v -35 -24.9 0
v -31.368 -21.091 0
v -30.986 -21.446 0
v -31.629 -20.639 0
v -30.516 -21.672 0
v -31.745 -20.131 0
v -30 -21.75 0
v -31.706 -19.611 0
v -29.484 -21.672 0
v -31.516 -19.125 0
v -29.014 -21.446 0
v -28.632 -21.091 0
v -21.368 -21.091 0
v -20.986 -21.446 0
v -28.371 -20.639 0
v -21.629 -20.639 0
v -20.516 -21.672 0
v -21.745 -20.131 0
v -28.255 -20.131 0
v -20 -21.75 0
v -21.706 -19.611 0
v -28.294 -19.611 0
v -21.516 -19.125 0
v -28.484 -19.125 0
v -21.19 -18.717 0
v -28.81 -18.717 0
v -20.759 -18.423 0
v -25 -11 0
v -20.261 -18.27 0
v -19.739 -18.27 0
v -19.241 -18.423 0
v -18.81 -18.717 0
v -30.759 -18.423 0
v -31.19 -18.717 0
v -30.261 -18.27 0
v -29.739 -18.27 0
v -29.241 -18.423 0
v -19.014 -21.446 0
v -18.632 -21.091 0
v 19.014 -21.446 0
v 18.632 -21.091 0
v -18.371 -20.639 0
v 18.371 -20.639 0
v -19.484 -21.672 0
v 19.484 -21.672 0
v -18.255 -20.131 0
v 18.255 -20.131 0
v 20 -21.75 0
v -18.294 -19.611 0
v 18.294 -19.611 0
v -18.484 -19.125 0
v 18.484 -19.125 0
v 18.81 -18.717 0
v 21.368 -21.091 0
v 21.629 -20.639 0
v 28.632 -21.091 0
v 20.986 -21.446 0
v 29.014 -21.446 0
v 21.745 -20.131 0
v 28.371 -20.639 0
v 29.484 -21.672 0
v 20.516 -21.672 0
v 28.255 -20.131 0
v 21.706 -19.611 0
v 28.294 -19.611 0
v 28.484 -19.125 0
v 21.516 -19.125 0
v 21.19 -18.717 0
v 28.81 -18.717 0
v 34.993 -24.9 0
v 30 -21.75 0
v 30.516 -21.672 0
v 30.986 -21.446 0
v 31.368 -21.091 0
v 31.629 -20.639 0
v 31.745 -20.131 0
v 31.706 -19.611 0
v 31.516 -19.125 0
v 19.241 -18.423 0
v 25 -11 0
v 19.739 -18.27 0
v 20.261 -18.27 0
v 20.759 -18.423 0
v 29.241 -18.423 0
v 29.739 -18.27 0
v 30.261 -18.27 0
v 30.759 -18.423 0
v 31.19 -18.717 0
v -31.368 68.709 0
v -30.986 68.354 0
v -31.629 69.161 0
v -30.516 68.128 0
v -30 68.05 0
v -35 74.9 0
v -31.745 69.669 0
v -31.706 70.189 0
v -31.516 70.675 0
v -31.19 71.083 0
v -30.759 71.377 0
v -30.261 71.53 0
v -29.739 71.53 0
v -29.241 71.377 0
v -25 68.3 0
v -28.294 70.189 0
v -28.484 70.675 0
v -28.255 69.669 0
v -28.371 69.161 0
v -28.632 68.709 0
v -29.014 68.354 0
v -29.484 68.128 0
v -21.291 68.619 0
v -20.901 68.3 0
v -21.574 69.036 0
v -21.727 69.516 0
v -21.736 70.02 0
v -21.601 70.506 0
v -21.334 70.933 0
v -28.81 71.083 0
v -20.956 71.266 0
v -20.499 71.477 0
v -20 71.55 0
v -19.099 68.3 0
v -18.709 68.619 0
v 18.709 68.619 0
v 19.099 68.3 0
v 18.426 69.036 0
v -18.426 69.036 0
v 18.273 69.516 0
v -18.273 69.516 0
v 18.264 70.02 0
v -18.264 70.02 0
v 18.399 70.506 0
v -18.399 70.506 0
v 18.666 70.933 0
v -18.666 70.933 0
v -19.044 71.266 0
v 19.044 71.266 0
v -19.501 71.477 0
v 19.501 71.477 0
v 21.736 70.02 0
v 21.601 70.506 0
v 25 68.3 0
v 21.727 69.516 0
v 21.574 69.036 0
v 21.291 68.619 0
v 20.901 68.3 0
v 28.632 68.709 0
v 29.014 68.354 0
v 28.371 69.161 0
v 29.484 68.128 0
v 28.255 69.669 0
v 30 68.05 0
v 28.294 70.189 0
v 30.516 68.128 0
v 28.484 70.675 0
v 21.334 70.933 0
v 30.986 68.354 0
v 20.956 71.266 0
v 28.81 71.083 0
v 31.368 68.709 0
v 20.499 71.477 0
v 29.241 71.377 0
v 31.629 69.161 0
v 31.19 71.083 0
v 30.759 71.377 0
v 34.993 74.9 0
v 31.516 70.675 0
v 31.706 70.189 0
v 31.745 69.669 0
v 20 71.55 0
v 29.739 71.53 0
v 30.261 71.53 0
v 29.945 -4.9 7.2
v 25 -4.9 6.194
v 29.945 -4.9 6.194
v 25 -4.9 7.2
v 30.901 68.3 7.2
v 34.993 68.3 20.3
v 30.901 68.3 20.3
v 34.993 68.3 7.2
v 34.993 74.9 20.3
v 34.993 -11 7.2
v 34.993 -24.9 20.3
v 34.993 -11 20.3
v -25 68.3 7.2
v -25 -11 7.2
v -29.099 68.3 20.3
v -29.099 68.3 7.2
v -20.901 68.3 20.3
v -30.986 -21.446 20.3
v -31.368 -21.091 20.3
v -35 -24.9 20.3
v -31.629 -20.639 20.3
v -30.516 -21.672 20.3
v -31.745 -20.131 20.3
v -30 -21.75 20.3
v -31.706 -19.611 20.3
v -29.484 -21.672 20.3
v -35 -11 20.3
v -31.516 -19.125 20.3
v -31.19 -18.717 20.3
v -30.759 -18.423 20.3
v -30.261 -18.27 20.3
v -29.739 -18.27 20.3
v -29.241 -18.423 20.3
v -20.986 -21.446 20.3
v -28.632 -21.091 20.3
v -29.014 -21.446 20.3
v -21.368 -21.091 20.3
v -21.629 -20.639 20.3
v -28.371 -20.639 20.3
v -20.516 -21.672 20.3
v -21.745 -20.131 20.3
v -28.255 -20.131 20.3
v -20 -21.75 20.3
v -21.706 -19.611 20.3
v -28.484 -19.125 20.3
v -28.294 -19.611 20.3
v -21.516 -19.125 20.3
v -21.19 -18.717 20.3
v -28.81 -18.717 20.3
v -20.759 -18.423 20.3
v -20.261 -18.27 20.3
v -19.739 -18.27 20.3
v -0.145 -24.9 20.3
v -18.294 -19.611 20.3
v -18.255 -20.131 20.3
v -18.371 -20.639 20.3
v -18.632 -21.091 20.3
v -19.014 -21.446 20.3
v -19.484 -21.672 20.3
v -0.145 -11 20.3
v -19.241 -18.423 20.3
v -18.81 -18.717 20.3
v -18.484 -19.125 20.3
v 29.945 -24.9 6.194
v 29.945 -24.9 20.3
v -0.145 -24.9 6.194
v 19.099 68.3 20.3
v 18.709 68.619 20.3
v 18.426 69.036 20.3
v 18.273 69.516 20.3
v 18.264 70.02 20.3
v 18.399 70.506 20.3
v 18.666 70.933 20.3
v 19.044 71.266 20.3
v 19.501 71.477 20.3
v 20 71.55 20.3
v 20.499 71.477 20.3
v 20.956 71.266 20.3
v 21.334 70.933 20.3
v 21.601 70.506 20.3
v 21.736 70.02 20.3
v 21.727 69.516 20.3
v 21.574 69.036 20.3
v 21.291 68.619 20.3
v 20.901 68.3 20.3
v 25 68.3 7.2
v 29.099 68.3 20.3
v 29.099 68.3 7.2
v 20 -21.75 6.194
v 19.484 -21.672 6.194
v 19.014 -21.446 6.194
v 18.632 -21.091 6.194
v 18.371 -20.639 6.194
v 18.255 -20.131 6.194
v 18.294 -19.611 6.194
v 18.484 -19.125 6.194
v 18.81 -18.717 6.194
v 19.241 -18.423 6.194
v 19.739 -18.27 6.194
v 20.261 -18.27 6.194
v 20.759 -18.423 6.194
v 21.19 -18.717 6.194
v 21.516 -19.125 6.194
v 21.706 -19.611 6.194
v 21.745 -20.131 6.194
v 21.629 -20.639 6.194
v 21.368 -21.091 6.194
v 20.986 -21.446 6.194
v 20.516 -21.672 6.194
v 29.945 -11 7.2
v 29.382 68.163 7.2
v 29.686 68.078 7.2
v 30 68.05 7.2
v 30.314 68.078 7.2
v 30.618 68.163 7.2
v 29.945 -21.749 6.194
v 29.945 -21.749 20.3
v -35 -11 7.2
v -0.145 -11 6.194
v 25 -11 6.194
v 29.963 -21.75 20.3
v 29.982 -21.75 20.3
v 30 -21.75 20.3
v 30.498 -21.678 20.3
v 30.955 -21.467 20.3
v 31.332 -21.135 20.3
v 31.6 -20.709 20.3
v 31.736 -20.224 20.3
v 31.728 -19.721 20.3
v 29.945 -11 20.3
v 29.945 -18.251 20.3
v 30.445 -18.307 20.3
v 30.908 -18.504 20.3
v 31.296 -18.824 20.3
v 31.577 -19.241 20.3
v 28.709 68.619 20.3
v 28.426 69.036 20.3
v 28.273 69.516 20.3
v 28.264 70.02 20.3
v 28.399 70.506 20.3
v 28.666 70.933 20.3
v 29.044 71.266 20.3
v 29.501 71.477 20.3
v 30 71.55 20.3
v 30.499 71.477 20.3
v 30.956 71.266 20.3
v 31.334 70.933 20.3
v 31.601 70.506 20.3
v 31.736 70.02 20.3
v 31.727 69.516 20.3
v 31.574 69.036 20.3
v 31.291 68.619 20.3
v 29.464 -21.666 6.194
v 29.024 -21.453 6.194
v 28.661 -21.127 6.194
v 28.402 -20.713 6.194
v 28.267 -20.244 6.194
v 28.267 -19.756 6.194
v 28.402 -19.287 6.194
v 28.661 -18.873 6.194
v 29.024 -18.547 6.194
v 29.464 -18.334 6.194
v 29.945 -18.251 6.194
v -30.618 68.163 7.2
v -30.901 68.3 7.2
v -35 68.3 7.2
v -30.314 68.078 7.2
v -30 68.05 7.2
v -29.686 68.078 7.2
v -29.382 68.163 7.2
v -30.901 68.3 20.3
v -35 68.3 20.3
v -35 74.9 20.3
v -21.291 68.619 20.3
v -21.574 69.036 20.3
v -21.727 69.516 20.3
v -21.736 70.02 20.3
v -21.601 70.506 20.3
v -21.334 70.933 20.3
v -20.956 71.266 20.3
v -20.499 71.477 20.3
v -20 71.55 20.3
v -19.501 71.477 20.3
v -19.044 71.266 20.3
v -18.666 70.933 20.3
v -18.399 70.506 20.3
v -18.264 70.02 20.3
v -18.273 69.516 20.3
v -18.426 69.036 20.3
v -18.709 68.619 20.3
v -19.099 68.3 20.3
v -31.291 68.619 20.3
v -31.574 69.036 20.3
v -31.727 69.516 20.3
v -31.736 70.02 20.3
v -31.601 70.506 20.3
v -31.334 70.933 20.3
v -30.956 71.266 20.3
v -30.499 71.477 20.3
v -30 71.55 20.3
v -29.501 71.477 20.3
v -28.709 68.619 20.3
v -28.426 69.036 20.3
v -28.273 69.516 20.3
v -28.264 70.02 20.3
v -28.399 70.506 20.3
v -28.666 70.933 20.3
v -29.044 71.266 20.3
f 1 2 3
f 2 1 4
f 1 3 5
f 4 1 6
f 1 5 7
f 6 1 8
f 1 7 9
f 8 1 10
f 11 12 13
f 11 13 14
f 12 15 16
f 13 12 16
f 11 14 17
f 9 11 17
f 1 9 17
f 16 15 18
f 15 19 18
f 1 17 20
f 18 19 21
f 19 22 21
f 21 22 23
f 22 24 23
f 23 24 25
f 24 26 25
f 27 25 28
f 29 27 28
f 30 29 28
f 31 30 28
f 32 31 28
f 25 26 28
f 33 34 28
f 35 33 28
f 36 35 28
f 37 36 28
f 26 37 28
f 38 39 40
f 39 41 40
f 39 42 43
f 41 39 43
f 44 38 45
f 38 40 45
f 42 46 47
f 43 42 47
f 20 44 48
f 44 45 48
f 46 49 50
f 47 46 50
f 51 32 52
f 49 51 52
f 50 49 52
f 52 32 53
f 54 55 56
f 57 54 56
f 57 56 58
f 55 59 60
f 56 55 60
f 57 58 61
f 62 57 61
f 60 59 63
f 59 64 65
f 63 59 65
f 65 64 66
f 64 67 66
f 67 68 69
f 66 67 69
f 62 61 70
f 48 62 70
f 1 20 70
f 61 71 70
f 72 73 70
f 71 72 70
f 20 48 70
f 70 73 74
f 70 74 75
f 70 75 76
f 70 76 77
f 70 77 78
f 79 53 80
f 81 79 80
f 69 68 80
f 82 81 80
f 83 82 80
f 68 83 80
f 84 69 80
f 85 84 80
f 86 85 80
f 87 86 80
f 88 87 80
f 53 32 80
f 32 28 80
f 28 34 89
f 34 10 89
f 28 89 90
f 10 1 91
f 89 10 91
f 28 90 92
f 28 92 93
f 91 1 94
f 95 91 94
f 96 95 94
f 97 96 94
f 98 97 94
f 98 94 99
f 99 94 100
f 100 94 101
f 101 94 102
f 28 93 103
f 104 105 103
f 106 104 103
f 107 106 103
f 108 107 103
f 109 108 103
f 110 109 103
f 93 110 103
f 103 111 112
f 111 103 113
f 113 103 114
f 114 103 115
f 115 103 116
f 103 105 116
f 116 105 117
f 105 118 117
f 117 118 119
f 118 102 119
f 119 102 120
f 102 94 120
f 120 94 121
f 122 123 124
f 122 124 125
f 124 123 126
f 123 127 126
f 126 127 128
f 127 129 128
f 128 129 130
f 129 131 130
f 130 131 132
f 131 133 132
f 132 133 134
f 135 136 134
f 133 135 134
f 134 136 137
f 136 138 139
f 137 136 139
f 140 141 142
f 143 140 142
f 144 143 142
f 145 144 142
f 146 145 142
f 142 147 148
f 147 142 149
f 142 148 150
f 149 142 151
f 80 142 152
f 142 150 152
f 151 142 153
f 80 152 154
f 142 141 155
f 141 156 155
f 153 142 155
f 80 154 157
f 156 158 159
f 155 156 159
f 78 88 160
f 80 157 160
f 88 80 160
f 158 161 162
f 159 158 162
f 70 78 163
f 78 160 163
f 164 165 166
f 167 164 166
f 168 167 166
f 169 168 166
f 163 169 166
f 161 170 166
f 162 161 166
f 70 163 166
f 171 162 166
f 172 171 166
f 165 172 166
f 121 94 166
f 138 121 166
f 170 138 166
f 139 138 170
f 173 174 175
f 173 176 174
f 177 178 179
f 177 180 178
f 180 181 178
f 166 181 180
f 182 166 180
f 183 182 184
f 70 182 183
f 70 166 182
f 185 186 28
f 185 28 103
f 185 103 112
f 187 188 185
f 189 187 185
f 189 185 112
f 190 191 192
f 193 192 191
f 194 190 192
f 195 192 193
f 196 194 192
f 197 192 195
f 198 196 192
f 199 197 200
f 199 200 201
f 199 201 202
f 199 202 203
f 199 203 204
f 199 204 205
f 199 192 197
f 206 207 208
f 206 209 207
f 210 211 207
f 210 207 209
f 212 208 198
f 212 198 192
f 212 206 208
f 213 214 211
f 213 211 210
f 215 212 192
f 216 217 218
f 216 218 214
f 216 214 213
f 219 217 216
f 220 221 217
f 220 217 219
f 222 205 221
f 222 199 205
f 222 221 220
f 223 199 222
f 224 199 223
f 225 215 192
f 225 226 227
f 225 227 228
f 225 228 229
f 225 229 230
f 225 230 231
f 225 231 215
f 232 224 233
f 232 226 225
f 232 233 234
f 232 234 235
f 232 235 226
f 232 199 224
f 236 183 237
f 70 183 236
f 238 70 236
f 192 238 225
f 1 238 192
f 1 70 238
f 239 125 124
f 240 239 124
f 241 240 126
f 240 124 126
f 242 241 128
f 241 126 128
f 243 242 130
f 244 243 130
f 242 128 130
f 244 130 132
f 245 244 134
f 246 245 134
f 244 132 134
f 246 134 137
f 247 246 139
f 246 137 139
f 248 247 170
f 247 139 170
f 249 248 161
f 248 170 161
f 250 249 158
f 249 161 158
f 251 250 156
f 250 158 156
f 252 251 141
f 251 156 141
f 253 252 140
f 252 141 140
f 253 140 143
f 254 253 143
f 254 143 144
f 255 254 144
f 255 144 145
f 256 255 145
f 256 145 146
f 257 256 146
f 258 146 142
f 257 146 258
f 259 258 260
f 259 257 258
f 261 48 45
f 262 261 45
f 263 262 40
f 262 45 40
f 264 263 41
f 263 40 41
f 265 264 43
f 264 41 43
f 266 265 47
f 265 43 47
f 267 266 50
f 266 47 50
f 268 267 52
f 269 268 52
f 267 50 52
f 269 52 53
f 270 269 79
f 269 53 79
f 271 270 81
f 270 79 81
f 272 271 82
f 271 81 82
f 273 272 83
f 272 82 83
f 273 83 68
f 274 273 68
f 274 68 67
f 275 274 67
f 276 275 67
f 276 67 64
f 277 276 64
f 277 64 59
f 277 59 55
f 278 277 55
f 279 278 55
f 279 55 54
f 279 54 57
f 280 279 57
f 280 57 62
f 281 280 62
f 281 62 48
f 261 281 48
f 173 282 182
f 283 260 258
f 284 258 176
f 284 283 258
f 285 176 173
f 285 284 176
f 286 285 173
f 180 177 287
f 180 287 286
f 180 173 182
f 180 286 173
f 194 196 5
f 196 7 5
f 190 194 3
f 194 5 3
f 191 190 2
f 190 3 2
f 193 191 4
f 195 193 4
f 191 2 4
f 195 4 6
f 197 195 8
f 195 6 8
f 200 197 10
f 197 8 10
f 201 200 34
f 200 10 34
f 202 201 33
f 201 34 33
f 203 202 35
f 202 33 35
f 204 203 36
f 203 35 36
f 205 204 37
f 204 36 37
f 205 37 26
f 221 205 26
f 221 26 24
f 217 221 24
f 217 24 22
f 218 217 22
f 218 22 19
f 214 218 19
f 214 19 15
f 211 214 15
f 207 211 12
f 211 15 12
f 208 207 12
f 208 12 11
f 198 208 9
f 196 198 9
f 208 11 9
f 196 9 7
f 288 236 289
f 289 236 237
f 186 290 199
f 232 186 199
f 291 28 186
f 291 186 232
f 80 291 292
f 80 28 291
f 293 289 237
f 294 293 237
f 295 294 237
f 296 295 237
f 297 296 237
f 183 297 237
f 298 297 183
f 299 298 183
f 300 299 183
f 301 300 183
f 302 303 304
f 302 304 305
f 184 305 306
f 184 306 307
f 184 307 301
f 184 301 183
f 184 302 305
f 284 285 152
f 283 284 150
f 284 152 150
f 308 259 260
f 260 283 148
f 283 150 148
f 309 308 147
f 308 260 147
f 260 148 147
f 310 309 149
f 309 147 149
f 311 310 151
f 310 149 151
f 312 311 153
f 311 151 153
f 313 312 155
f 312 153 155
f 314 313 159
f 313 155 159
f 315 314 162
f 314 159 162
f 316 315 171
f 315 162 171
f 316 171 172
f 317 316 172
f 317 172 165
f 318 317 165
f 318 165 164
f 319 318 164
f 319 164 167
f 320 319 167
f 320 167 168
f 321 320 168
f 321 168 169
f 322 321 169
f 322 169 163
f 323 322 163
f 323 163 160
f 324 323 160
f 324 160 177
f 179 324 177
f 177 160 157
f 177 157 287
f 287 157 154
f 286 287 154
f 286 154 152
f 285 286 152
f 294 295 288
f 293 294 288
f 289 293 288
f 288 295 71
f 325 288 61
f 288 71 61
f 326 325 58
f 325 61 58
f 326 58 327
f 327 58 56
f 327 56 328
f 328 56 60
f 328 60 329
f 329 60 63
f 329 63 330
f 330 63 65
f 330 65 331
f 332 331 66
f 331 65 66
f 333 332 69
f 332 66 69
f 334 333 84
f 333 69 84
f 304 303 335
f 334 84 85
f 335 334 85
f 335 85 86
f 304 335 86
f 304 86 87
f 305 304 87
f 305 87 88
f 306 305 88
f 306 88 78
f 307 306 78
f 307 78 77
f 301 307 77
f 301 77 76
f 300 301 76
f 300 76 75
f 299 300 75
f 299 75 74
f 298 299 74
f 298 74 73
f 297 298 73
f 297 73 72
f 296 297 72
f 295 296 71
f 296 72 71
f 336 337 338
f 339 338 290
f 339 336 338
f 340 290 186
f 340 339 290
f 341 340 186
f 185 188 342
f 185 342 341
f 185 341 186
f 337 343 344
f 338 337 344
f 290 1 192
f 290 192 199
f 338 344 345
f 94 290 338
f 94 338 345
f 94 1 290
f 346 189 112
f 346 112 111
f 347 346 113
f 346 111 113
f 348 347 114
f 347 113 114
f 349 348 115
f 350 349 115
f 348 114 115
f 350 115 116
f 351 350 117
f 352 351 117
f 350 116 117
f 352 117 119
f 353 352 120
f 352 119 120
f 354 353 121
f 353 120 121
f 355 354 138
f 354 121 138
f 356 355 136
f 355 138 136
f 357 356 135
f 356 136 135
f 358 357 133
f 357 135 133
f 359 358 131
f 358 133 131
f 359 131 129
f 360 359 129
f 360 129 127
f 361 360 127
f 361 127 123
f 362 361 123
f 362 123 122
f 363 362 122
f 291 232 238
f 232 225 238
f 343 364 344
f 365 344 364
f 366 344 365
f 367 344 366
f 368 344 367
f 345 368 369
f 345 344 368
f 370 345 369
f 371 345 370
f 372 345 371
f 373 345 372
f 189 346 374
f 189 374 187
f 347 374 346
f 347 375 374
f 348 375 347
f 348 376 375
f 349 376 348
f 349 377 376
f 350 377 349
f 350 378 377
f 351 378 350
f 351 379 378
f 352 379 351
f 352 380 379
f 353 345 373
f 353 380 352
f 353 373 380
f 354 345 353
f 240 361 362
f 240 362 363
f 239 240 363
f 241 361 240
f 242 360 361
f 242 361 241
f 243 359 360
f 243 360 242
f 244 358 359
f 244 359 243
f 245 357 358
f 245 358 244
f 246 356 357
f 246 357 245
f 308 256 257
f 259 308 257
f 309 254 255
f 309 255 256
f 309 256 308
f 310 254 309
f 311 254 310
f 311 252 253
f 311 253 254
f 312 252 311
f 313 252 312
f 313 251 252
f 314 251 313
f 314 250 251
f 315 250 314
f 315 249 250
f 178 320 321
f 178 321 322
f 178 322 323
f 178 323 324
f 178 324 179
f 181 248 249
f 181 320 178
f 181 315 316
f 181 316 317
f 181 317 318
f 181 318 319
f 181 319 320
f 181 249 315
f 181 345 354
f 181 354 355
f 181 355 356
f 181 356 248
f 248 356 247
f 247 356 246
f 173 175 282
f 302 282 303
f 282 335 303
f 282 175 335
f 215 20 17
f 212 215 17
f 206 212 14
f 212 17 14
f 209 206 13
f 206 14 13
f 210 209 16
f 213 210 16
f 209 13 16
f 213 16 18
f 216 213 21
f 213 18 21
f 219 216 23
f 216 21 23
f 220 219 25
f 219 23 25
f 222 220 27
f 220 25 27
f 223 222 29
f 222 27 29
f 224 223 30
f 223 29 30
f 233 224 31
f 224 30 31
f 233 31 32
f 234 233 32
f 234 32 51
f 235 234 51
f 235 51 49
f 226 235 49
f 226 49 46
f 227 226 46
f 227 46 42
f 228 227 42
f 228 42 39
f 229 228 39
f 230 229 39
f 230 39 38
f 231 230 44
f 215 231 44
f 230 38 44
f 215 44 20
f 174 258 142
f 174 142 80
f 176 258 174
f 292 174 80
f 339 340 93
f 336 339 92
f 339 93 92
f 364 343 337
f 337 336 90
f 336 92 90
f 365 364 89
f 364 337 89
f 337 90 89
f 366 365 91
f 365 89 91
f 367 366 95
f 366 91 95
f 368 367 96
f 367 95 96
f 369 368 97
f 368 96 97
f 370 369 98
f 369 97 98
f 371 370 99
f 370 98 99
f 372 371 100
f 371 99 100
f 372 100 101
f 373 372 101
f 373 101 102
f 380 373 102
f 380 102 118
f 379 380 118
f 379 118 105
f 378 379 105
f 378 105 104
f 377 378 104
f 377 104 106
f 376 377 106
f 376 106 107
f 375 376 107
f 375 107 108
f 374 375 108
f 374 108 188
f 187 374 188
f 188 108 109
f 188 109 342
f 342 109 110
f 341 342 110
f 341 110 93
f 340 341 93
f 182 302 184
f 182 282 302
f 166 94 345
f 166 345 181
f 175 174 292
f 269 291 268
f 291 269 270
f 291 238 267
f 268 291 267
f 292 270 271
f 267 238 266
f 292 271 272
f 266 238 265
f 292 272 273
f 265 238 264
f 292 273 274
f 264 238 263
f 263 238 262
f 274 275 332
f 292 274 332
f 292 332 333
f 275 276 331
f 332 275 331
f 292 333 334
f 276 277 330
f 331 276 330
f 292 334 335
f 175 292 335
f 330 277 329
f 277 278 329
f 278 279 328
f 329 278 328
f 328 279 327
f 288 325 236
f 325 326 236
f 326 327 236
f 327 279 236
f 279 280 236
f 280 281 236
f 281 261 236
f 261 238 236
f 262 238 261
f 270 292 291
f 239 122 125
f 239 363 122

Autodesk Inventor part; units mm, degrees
ref_plane "YZ Plane" through (0, 0, 0) normal (1, 0, 0) x (0, 1, 0)
ref_plane "Arbeitsebene1" through (0, 0, 0) normal (0, 0, 1) x (1, 0, 0)
sketch "Skizze1" plane through (0, 0, 0) normal (0, 0, 1) x (1, 0, 0)
  arc A0 (63.4381, 5.6873) -> (63.3881, 5.2) centre (65.7881, 5.2) ccw construction
  line L0 (63.4381, 5.6873) -> (63.4381, 7.6) construction
  line L1 (63.4381, 7.6) -> (65.7881, 7.6) construction
  arc A1 (68.1881, 5.2) -> (65.7881, 7.6) centre (65.7881, 5.2) ccw construction
  line L2 (68.1881, 5.2) -> (68.1881, -5.2) construction
  arc A2 (65.7881, -7.6) -> (68.1881, -5.2) centre (65.7881, -5.2) ccw construction
  line L3 (65.7881, -7.6) -> (63.4381, -7.6) construction
  line L4 (63.4381, -7.6) -> (63.4381, -5.6873) construction
  arc A3 (63.3881, -5.2) -> (63.4381, -5.6873) centre (65.7881, -5.2) ccw construction
  line L5 (63.3881, -5.2) -> (63.3881, 5.2) construction
  arc A4 (-72.9, 74.9) -> (-74.9, 72.9) centre (-72.9, 72.9) ccw construction
  line L6 (-74.9, 72.9) -> (-74.9, -22.9) construction
  arc A5 (-74.9, -22.9) -> (-72.9, -24.9) centre (-72.9, -22.9) ccw construction
  line L7 (-72.9, -24.9) -> (72.9, -24.9) construction
  arc A6 (72.9, -24.9) -> (74.9, -22.9) centre (72.9, -22.9) ccw construction
  line L8 (74.9, -22.9) -> (74.9, 72.9) construction
  arc A7 (74.9, 72.9) -> (72.9, 74.9) centre (72.9, 72.9) ccw construction
  line L9 (72.9, 74.9) -> (-72.9, 74.9) construction
  circle A8 centre (-70, -20) radius 1.6 construction
  circle A9 centre (70, -20) radius 1.6 construction
  circle A10 centre (70, 20) radius 1.6 construction
  circle A11 centre (-70, 20) radius 1.6 construction
  arc A12 (-58.3017, -21.066) -> (-56.7383, -21.066) centre (-57.52, -20.62) ccw construction
  line L10 (-58.3017, -21.066) -> (-67.9, -21.066) construction
  line L11 (-67.9, -21.066) -> (-67.9, -9) construction
  line L12 (-67.9, -9) -> (-64.5, -9) construction
  arc A13 (-64.5, -9) -> (-61.5, -6) centre (-64.5, -6) ccw construction
  line L13 (-61.5, -6) -> (-61.5, 6) construction
  arc A14 (-61.5, 6) -> (-64.5, 9) centre (-64.5, 6) ccw construction
  line L14 (-64.5, 9) -> (-67.9, 9) construction
  line L15 (-67.9, 28.5) -> (-67.9, 64.9) construction
  line L16 (67.9, 64.9) -> (67.9, 28.5) construction
  arc A15 (64.9, 9) -> (67.9, 12) centre (64.9, 12) ccw construction
  line L17 (64.5, 9) -> (64.9, 9) construction
  arc A16 (64.5, 9) -> (61.5, 6) centre (64.5, 6) ccw construction
  line L18 (61.5, -6) -> (61.5, 6) construction
  arc A17 (61.5, -6) -> (64.5, -9) centre (64.5, -6) ccw construction
  line L19 (64.9, -9) -> (64.5, -9) construction
  arc A18 (67.9, -12) -> (64.9, -9) centre (64.9, -12) ccw construction
  line L20 (67.9, -12) -> (67.9, -21.066) construction
  line L21 (67.9, -21.066) -> (58.3017, -21.066) construction
  arc A19 (56.7383, -21.066) -> (58.3017, -21.066) centre (57.52, -20.62) ccw construction
  line L22 (56.7383, -21.066) -> (43.0617, -21.066) construction
  arc A20 (41.4983, -21.066) -> (43.0617, -21.066) centre (42.28, -20.62) ccw construction
  line L23 (41.4983, -21.066) -> (31.1932, -21.066) construction
  arc A21 (28.8068, -21.066) -> (31.1932, -21.066) centre (30, -20) ccw construction
  line L24 (28.8068, -21.066) -> (21.1932, -21.066) construction
  arc A22 (18.8068, -21.066) -> (21.1932, -21.066) centre (20, -20) ccw construction
  line L25 (18.8068, -21.066) -> (-18.8068, -21.066) construction
  arc A23 (-21.1932, -21.066) -> (-18.8068, -21.066) centre (-20, -20) ccw construction
  line L26 (-21.1932, -21.066) -> (-28.8068, -21.066) construction
  arc A24 (-31.1932, -21.066) -> (-28.8068, -21.066) centre (-30, -20) ccw construction
  line L27 (-31.1932, -21.066) -> (-41.4983, -21.066) construction
  arc A25 (-43.0617, -21.066) -> (-41.4983, -21.066) centre (-42.28, -20.62) ccw construction
  line L28 (-43.0617, -21.066) -> (-56.7383, -21.066) construction
  arc A26 (-63.4381, -5.6873) -> (-63.3881, -5.2) centre (-65.7881, -5.2) ccw construction
  line L29 (-63.4381, -5.6873) -> (-63.4381, -7.6) construction
  line L30 (-63.4381, -7.6) -> (-65.7881, -7.6) construction
  arc A27 (-68.1881, -5.2) -> (-65.7881, -7.6) centre (-65.7881, -5.2) ccw construction
  line L31 (-68.1881, -5.2) -> (-68.1881, 5.2) construction
  arc A28 (-65.7881, 7.6) -> (-68.1881, 5.2) centre (-65.7881, 5.2) ccw construction
  line L32 (-65.7881, 7.6) -> (-63.4381, 7.6) construction
  line L33 (-63.4381, 7.6) -> (-63.4381, 5.6873) construction
  arc A29 (-63.3881, 5.2) -> (-63.4381, 5.6873) centre (-65.7881, 5.2) ccw construction
  line L34 (-63.3881, 5.2) -> (-63.3881, -5.2) construction
  arc A30 (-63.4381, -55.4873) -> (-63.3881, -55) centre (-65.7881, -55) ccw construction
  line L35 (-63.4381, -55.4873) -> (-63.4381, -57.4) construction
  line L36 (-63.4381, -57.4) -> (-65.7881, -57.4) construction
  arc A31 (-68.1881, -55) -> (-65.7881, -57.4) centre (-65.7881, -55) ccw construction
  line L37 (-68.1881, -55) -> (-68.1881, -44.6) construction
  arc A32 (-65.7881, -42.2) -> (-68.1881, -44.6) centre (-65.7881, -44.6) ccw construction
  line L38 (-65.7881, -42.2) -> (-63.4381, -42.2) construction
  line L39 (-63.4381, -42.2) -> (-63.4381, -44.1127) construction
  arc A33 (-63.3881, -44.6) -> (-63.4381, -44.1127) centre (-65.7881, -44.6) ccw construction
  line L40 (-63.3881, -44.6) -> (-63.3881, -55) construction
  arc A34 (72.9, -74.7) -> (74.9, -72.7) centre (72.9, -72.7) ccw construction
  line L41 (74.9, -72.7) -> (74.9, -26.9) construction
  arc A35 (74.9, -26.9) -> (72.9, -24.9) centre (72.9, -26.9) ccw construction
  line L42 (72.9, -24.9) -> (-72.9, -24.9) construction
  arc A36 (-72.9, -24.9) -> (-74.9, -26.9) centre (-72.9, -26.9) ccw construction
  line L43 (-74.9, -26.9) -> (-74.9, -72.7) construction
  arc A37 (-74.9, -72.7) -> (-72.9, -74.7) centre (-72.9, -72.7) ccw construction
  line L44 (-72.9, -74.7) -> (72.9, -74.7) construction
  circle A38 centre (70, -29.8) radius 1.6 construction
  circle A39 centre (-70, -29.8) radius 1.6 construction
  circle A40 centre (-70, -69.8) radius 1.6 construction
  circle A41 centre (70, -69.8) radius 1.6 construction
  arc A42 (58.3017, -28.734) -> (56.7383, -28.734) centre (57.52, -29.18) ccw construction
  line L45 (58.3017, -28.734) -> (67.9, -28.734) construction
  line L46 (67.9, -28.734) -> (67.9, -40.8) construction
  line L47 (67.9, -40.8) -> (64.5, -40.8) construction
  arc A43 (64.5, -40.8) -> (61.5, -43.8) centre (64.5, -43.8) ccw construction
  line L48 (61.5, -43.8) -> (61.5, -55.8) construction
  arc A44 (61.5, -55.8) -> (64.5, -58.8) centre (64.5, -55.8) ccw construction
  line L49 (64.5, -58.8) -> (67.9, -58.8) construction
  line L50 (67.9, -58.8) -> (67.9, -70.866) construction
  line L51 (67.9, -70.866) -> (31.1932, -70.866) construction
  arc A45 (28.8068, -70.866) -> (31.1932, -70.866) centre (30, -69.8) ccw construction
  line L52 (28.8068, -70.866) -> (21.1932, -70.866) construction
  arc A46 (18.8068, -70.866) -> (21.1932, -70.866) centre (20, -69.8) ccw construction
  line L53 (18.8068, -70.866) -> (-18.8068, -70.866) construction
  arc A47 (-21.1932, -70.866) -> (-18.8068, -70.866) centre (-20, -69.8) ccw construction
  line L54 (-21.1932, -70.866) -> (-28.8068, -70.866) construction
  arc A48 (-31.1932, -70.866) -> (-28.8068, -70.866) centre (-30, -69.8) ccw construction
  line L55 (-31.1932, -70.866) -> (-67.9, -70.866) construction
  line L56 (-67.9, -70.866) -> (-67.9, -61.8) construction
  arc A49 (-64.9, -58.8) -> (-67.9, -61.8) centre (-64.9, -61.8) ccw construction
  line L57 (-64.5, -58.8) -> (-64.9, -58.8) construction
  arc A50 (-64.5, -58.8) -> (-61.5, -55.8) centre (-64.5, -55.8) ccw construction
  line L58 (-61.5, -43.8) -> (-61.5, -55.8) construction
  arc A51 (-61.5, -43.8) -> (-64.5, -40.8) centre (-64.5, -43.8) ccw construction
  line L59 (-64.9, -40.8) -> (-64.5, -40.8) construction
  arc A52 (-67.9, -37.8) -> (-64.9, -40.8) centre (-64.9, -37.8) ccw construction
  line L60 (-67.9, -37.8) -> (-67.9, -28.734) construction
  line L61 (-67.9, -28.734) -> (-58.3017, -28.734) construction
  arc A53 (-56.7383, -28.734) -> (-58.3017, -28.734) centre (-57.52, -29.18) ccw construction
  line L62 (-56.7383, -28.734) -> (-43.0617, -28.734) construction
  arc A54 (-41.4983, -28.734) -> (-43.0617, -28.734) centre (-42.28, -29.18) ccw construction
  line L63 (-41.4983, -28.734) -> (-31.1932, -28.734) construction
  arc A55 (-28.8068, -28.734) -> (-31.1932, -28.734) centre (-30, -29.8) ccw construction
  line L64 (-28.8068, -28.734) -> (-21.1932, -28.734) construction
  arc A56 (-18.8068, -28.734) -> (-21.1932, -28.734) centre (-20, -29.8) ccw construction
  line L65 (-18.8068, -28.734) -> (18.8068, -28.734) construction
  arc A57 (21.1932, -28.734) -> (18.8068, -28.734) centre (20, -29.8) ccw construction
  line L66 (21.1932, -28.734) -> (28.8068, -28.734) construction
  arc A58 (31.1932, -28.734) -> (28.8068, -28.734) centre (30, -29.8) ccw construction
  line L67 (31.1932, -28.734) -> (41.4983, -28.734) construction
  arc A59 (43.0617, -28.734) -> (41.4983, -28.734) centre (42.28, -29.18) ccw construction
  line L68 (43.0617, -28.734) -> (56.7383, -28.734) construction
  arc A60 (63.4381, -44.1127) -> (63.3881, -44.6) centre (65.7881, -44.6) ccw construction
  line L69 (63.4381, -44.1127) -> (63.4381, -42.2) construction
  line L70 (63.4381, -42.2) -> (65.7881, -42.2) construction
  arc A61 (68.1881, -44.6) -> (65.7881, -42.2) centre (65.7881, -44.6) ccw construction
  line L71 (68.1881, -44.6) -> (68.1881, -55) construction
  arc A62 (65.7881, -57.4) -> (68.1881, -55) centre (65.7881, -55) ccw construction
  line L72 (65.7881, -57.4) -> (63.4381, -57.4) construction
  line L73 (63.4381, -57.4) -> (63.4381, -55.4873) construction
  arc A63 (63.3881, -55) -> (63.4381, -55.4873) centre (65.7881, -55) ccw construction
  line L74 (63.3881, -55) -> (63.3881, -44.6) construction
  line L75 (34.9926, -24.9) -> (-35, -24.9)
  line L76 (-35, -24.9) -> (-35, 74.9)
  line L77 (-35, 74.9) -> (34.9926, 74.9)
  line L78 (34.9926, 74.9) -> (34.9926, -24.9)
  line L79 (-67.9, 64.9) -> (-64.9, 67.9) projected
  line L80 (-64.9, 67.9) -> (64.9, 67.9) projected
  line L81 (64.9, 67.9) -> (67.9, 64.9) projected
  line L82 (-67.9, 28.5) -> (67.9, 28.5) projected
  circle A64 centre (-30, 70) radius 1.6 projected
  circle A65 centre (-70, 30) radius 1.6 projected
  circle A66 centre (20, 70) radius 1.6 projected
  circle A67 centre (70, 70) radius 1.6 projected
  circle A68 centre (70, 30) radius 1.6 projected
  circle A69 centre (30, 70) radius 1.6 projected
  circle A70 centre (-70, 70) radius 1.6 projected
  circle A71 centre (-20, 70) radius 1.6 projected
  line L83 (-67.9, 9) -> (-67.9, 21.5) projected
  line L84 (67.9, 21.5) -> (-67.9, 21.5) projected
  line L85 (67.9, 21.5) -> (67.9, 12) projected
  line L86 (-72.9, -24.9) -> (72.9, -24.9)
  point P0 (0, 0)
  point P1 (-67.9, 21.066)
  point P2 (67.9, 21.066)
ref_plane "Arbeitsebene2" through (74.9, 24.9, 0) normal (1, 0, 0) x (0, -1, 0)
ref_plane "Arbeitsebene3" through (-73.1, -57.9, 7.2) normal (0, 0, -1) x (0, 1, 0)
extrude "Extrusion2" add sketch "Skizze1" along normal up to surface (7.2 mm away) contours L75 L76 L84 L78 | L84 L76 L82 L78 | L82 L76 L80 L78 | L80 L76 L77 L78 | A64 | A66 | A69 | A71
sketch "Skizze3" plane through (-35, -24.9, 7.2) normal (0, 0, 1) x (1, 0, 0)
  line L0 (-40.1, 14.9) -> (109.9, 14.9) construction
  line L1 (109.9, 92.2) -> (-40.1, 92.2) construction
  line L2 (0, 99.8) -> (0, 0) construction
  line L3 (0, 0) -> (69.9926, 0) construction
  line L4 (69.9926, 0) -> (69.9926, 99.8) construction
  line L5 (69.9926, 99.8) -> (0, 99.8) construction
  line L6 (69.9926, 0) -> (0, 0) construction
  line L7 (69.9926, 0) -> (0, 0) construction
  line L8 (0, 0) -> (0, 13.9) construction
  line L9 (0, 13.9) -> (69.9926, 13.9) construction
  line L10 (69.9926, 13.9) -> (69.9926, 0) construction
  line L11 (69.9926, 99.8) -> (69.9926, 0) construction
  line L12 (69.9926, 99.8) -> (0, 99.8) construction
  line L13 (0, 99.8) -> (0, 93.2) construction
  line L14 (0, 93.2) -> (69.9926, 93.2) construction
  line L15 (69.9926, 93.2) -> (69.9926, 99.8) construction
  line L16 (69.9926, 0) -> (0, 0)
  line L17 (0, 0) -> (0, 13.9)
  line L18 (0, 13.9) -> (69.9926, 13.9)
  line L19 (69.9926, 13.9) -> (69.9926, 0)
  line L20 (0, 0) -> (0, 99.8) projected
  line L21 (0, 99.8) -> (69.9926, 99.8)
  line L22 (69.9926, 99.8) -> (69.9926, 93.2)
  line L23 (69.9926, 93.2) -> (0, 93.2)
  line L24 (0, 93.2) -> (0, 99.8)
  point P0 (35, 24.9)
  dimension "d8" = 1
  dimension "d9" = 1
ref_plane "Arbeitsebene4" through (-73.1, -57.9, 20.3) normal (0, 0, 1) x (1, 0, 0)
extrude "Extrusion3" add sketch "Skizze3" along normal up to surface (13.1 mm away)
sketch "Skizze4" plane through (-35, -24.9, 20.3) normal (0, 0, 1) x (1, 0, 0)
  circle A0 centre (65, 4.9) radius 1.6 projected
  circle A1 centre (55, 4.9) radius 1.6 projected
  circle A2 centre (15, 4.9) radius 1.6 projected
  circle A3 centre (5, 4.9) radius 1.6 projected
  circle A4 centre (5, 94.7) radius 1.6 projected
  circle A5 centre (15, 94.7) radius 1.6 projected
  line L0 (69.9926, 0) -> (0, 0) projected
  line L1 (0, 0) -> (0, 99.8) projected
  line L2 (0, 99.8) -> (69.9926, 99.8) projected
  line L3 (69.9926, 99.8) -> (69.9926, 0) projected
  circle A6 centre (55, 94.7) radius 1.6 projected
  circle A7 centre (65, 94.7) radius 1.6 projected
  point P0 (35, 24.9)
hole "Bohrung1" at (30, -20, 20.3) at (20, -20, 20.3) at (-20, -20, 20.3) at (-30, -20, 20.3) at (30, 69.8, 20.3) at (20, 69.8, 20.3) at (-20, 69.8, 20.3) at (-30, 69.8, 20.3) direction (0, 0, -1) diameter 3.5 end through all
sketch "Skizze5" plane through (-35, -11, 7.2) normal (0, 0, 1) x (1, 0, 0)
  arc A0 (14.0986, 79.3) -> (15.9014, 79.3) centre (15, 80.8) ccw projected
  line L0 (14.0986, 79.3) -> (5.9014, 79.3) projected
  arc A1 (4.0986, 79.3) -> (5.9014, 79.3) centre (5, 80.8) ccw projected
  line L1 (4.0986, 79.3) -> (0, 79.3) projected
  line L2 (0, 79.3) -> (0, 0) projected
  line L3 (0, 0) -> (69.9926, 0) projected
  line L4 (69.9926, 0) -> (69.9926, 79.3) projected
  line L5 (69.9926, 79.3) -> (65.9014, 79.3) projected
  arc A2 (64.0986, 79.3) -> (65.9014, 79.3) centre (65, 80.8) ccw projected
  line L6 (64.0986, 79.3) -> (55.9014, 79.3) projected
  arc A3 (54.0986, 79.3) -> (55.9014, 79.3) centre (55, 80.8) ccw projected
  line L7 (54.0986, 79.3) -> (15.9014, 79.3) projected
  line L8 (0, 0) -> (69.9926, 0) projected
  line L9 (14.0986, 79.3) -> (5.9014, 79.3) projected
  line L10 (60, 0) -> (10, 0)
  line L11 (10, 0) -> (10, 79.3)
  line L12 (10, 79.3) -> (60, 79.3)
  line L13 (60, 79.3) -> (60, 0)
  point P0 (35, 11)
extrude "Extrusion4" cut sketch "Skizze5" against normal blind 10 contours L12 A0 | A0 L7 A3 L6 L13 L3 L11 L0 | L12 A3
sketch "Skizze6" plane through (-35, -24.9, 0) normal (0, -1, 0) x (1, 0, 0)
  line L0 (0, 0) -> (0, 20.3) projected
  line L1 (69.9926, 0) -> (0, 0) projected
  line L2 (69.9926, 0) -> (69.9926, 20.3) projected
  line L3 (69.9926, 20.3) -> (0, 20.3) projected
  point P0 (35, 0)
sketch "Skizze7" plane through (-35, -24.9, 0) normal (0, -1, 0) x (1, 0, 0)
  line L0 (74.9, 16.6407) -> (96.8, 16.6407) construction
  line L1 (74.9, 9.8533) -> (74.9, 16.6407) construction
  line L2 (96.8, 9.8533) -> (74.9, 9.8533) construction
  line L3 (96.8, 16.6407) -> (96.8, 9.8533) construction
  line L4 (39.9, 9.8533) -> (39.9, 16.6407) construction
  line L5 (39.9, 16.6407) -> (59.9, 16.6407) construction
  line L6 (59.9, 9.8533) -> (39.9, 9.8533) construction
  line L7 (0, 0) -> (0, 20.3) construction
  line L8 (69.9926, 0) -> (0, 0) construction
  line L9 (69.9926, 0) -> (69.9926, 20.3) construction
  line L10 (69.9926, 20.3) -> (0, 20.3) construction
  line L11 (59.9, 16.6407) -> (59.9, 9.8533) construction
  line L12 (34.8554, 6.194) -> (64.9446, 6.194)
  line L13 (64.9446, 6.194) -> (64.9446, 20.3)
  line L14 (64.9446, 20.3) -> (34.8554, 20.3)
  line L15 (34.8554, 20.3) -> (34.8554, 6.194)
  line L16 (34.8554, 6.194) -> (64.9446, 20.3) construction
  line L17 (64.9446, 6.194) -> (34.8554, 20.3) construction
  point P0 (35, 0)
  point P1 (49.9, 13.247)
extrude "Extrusion5" cut sketch "Skizze7" against normal blind 20
properties part number "20_Projector_Sony_Mount_1"
